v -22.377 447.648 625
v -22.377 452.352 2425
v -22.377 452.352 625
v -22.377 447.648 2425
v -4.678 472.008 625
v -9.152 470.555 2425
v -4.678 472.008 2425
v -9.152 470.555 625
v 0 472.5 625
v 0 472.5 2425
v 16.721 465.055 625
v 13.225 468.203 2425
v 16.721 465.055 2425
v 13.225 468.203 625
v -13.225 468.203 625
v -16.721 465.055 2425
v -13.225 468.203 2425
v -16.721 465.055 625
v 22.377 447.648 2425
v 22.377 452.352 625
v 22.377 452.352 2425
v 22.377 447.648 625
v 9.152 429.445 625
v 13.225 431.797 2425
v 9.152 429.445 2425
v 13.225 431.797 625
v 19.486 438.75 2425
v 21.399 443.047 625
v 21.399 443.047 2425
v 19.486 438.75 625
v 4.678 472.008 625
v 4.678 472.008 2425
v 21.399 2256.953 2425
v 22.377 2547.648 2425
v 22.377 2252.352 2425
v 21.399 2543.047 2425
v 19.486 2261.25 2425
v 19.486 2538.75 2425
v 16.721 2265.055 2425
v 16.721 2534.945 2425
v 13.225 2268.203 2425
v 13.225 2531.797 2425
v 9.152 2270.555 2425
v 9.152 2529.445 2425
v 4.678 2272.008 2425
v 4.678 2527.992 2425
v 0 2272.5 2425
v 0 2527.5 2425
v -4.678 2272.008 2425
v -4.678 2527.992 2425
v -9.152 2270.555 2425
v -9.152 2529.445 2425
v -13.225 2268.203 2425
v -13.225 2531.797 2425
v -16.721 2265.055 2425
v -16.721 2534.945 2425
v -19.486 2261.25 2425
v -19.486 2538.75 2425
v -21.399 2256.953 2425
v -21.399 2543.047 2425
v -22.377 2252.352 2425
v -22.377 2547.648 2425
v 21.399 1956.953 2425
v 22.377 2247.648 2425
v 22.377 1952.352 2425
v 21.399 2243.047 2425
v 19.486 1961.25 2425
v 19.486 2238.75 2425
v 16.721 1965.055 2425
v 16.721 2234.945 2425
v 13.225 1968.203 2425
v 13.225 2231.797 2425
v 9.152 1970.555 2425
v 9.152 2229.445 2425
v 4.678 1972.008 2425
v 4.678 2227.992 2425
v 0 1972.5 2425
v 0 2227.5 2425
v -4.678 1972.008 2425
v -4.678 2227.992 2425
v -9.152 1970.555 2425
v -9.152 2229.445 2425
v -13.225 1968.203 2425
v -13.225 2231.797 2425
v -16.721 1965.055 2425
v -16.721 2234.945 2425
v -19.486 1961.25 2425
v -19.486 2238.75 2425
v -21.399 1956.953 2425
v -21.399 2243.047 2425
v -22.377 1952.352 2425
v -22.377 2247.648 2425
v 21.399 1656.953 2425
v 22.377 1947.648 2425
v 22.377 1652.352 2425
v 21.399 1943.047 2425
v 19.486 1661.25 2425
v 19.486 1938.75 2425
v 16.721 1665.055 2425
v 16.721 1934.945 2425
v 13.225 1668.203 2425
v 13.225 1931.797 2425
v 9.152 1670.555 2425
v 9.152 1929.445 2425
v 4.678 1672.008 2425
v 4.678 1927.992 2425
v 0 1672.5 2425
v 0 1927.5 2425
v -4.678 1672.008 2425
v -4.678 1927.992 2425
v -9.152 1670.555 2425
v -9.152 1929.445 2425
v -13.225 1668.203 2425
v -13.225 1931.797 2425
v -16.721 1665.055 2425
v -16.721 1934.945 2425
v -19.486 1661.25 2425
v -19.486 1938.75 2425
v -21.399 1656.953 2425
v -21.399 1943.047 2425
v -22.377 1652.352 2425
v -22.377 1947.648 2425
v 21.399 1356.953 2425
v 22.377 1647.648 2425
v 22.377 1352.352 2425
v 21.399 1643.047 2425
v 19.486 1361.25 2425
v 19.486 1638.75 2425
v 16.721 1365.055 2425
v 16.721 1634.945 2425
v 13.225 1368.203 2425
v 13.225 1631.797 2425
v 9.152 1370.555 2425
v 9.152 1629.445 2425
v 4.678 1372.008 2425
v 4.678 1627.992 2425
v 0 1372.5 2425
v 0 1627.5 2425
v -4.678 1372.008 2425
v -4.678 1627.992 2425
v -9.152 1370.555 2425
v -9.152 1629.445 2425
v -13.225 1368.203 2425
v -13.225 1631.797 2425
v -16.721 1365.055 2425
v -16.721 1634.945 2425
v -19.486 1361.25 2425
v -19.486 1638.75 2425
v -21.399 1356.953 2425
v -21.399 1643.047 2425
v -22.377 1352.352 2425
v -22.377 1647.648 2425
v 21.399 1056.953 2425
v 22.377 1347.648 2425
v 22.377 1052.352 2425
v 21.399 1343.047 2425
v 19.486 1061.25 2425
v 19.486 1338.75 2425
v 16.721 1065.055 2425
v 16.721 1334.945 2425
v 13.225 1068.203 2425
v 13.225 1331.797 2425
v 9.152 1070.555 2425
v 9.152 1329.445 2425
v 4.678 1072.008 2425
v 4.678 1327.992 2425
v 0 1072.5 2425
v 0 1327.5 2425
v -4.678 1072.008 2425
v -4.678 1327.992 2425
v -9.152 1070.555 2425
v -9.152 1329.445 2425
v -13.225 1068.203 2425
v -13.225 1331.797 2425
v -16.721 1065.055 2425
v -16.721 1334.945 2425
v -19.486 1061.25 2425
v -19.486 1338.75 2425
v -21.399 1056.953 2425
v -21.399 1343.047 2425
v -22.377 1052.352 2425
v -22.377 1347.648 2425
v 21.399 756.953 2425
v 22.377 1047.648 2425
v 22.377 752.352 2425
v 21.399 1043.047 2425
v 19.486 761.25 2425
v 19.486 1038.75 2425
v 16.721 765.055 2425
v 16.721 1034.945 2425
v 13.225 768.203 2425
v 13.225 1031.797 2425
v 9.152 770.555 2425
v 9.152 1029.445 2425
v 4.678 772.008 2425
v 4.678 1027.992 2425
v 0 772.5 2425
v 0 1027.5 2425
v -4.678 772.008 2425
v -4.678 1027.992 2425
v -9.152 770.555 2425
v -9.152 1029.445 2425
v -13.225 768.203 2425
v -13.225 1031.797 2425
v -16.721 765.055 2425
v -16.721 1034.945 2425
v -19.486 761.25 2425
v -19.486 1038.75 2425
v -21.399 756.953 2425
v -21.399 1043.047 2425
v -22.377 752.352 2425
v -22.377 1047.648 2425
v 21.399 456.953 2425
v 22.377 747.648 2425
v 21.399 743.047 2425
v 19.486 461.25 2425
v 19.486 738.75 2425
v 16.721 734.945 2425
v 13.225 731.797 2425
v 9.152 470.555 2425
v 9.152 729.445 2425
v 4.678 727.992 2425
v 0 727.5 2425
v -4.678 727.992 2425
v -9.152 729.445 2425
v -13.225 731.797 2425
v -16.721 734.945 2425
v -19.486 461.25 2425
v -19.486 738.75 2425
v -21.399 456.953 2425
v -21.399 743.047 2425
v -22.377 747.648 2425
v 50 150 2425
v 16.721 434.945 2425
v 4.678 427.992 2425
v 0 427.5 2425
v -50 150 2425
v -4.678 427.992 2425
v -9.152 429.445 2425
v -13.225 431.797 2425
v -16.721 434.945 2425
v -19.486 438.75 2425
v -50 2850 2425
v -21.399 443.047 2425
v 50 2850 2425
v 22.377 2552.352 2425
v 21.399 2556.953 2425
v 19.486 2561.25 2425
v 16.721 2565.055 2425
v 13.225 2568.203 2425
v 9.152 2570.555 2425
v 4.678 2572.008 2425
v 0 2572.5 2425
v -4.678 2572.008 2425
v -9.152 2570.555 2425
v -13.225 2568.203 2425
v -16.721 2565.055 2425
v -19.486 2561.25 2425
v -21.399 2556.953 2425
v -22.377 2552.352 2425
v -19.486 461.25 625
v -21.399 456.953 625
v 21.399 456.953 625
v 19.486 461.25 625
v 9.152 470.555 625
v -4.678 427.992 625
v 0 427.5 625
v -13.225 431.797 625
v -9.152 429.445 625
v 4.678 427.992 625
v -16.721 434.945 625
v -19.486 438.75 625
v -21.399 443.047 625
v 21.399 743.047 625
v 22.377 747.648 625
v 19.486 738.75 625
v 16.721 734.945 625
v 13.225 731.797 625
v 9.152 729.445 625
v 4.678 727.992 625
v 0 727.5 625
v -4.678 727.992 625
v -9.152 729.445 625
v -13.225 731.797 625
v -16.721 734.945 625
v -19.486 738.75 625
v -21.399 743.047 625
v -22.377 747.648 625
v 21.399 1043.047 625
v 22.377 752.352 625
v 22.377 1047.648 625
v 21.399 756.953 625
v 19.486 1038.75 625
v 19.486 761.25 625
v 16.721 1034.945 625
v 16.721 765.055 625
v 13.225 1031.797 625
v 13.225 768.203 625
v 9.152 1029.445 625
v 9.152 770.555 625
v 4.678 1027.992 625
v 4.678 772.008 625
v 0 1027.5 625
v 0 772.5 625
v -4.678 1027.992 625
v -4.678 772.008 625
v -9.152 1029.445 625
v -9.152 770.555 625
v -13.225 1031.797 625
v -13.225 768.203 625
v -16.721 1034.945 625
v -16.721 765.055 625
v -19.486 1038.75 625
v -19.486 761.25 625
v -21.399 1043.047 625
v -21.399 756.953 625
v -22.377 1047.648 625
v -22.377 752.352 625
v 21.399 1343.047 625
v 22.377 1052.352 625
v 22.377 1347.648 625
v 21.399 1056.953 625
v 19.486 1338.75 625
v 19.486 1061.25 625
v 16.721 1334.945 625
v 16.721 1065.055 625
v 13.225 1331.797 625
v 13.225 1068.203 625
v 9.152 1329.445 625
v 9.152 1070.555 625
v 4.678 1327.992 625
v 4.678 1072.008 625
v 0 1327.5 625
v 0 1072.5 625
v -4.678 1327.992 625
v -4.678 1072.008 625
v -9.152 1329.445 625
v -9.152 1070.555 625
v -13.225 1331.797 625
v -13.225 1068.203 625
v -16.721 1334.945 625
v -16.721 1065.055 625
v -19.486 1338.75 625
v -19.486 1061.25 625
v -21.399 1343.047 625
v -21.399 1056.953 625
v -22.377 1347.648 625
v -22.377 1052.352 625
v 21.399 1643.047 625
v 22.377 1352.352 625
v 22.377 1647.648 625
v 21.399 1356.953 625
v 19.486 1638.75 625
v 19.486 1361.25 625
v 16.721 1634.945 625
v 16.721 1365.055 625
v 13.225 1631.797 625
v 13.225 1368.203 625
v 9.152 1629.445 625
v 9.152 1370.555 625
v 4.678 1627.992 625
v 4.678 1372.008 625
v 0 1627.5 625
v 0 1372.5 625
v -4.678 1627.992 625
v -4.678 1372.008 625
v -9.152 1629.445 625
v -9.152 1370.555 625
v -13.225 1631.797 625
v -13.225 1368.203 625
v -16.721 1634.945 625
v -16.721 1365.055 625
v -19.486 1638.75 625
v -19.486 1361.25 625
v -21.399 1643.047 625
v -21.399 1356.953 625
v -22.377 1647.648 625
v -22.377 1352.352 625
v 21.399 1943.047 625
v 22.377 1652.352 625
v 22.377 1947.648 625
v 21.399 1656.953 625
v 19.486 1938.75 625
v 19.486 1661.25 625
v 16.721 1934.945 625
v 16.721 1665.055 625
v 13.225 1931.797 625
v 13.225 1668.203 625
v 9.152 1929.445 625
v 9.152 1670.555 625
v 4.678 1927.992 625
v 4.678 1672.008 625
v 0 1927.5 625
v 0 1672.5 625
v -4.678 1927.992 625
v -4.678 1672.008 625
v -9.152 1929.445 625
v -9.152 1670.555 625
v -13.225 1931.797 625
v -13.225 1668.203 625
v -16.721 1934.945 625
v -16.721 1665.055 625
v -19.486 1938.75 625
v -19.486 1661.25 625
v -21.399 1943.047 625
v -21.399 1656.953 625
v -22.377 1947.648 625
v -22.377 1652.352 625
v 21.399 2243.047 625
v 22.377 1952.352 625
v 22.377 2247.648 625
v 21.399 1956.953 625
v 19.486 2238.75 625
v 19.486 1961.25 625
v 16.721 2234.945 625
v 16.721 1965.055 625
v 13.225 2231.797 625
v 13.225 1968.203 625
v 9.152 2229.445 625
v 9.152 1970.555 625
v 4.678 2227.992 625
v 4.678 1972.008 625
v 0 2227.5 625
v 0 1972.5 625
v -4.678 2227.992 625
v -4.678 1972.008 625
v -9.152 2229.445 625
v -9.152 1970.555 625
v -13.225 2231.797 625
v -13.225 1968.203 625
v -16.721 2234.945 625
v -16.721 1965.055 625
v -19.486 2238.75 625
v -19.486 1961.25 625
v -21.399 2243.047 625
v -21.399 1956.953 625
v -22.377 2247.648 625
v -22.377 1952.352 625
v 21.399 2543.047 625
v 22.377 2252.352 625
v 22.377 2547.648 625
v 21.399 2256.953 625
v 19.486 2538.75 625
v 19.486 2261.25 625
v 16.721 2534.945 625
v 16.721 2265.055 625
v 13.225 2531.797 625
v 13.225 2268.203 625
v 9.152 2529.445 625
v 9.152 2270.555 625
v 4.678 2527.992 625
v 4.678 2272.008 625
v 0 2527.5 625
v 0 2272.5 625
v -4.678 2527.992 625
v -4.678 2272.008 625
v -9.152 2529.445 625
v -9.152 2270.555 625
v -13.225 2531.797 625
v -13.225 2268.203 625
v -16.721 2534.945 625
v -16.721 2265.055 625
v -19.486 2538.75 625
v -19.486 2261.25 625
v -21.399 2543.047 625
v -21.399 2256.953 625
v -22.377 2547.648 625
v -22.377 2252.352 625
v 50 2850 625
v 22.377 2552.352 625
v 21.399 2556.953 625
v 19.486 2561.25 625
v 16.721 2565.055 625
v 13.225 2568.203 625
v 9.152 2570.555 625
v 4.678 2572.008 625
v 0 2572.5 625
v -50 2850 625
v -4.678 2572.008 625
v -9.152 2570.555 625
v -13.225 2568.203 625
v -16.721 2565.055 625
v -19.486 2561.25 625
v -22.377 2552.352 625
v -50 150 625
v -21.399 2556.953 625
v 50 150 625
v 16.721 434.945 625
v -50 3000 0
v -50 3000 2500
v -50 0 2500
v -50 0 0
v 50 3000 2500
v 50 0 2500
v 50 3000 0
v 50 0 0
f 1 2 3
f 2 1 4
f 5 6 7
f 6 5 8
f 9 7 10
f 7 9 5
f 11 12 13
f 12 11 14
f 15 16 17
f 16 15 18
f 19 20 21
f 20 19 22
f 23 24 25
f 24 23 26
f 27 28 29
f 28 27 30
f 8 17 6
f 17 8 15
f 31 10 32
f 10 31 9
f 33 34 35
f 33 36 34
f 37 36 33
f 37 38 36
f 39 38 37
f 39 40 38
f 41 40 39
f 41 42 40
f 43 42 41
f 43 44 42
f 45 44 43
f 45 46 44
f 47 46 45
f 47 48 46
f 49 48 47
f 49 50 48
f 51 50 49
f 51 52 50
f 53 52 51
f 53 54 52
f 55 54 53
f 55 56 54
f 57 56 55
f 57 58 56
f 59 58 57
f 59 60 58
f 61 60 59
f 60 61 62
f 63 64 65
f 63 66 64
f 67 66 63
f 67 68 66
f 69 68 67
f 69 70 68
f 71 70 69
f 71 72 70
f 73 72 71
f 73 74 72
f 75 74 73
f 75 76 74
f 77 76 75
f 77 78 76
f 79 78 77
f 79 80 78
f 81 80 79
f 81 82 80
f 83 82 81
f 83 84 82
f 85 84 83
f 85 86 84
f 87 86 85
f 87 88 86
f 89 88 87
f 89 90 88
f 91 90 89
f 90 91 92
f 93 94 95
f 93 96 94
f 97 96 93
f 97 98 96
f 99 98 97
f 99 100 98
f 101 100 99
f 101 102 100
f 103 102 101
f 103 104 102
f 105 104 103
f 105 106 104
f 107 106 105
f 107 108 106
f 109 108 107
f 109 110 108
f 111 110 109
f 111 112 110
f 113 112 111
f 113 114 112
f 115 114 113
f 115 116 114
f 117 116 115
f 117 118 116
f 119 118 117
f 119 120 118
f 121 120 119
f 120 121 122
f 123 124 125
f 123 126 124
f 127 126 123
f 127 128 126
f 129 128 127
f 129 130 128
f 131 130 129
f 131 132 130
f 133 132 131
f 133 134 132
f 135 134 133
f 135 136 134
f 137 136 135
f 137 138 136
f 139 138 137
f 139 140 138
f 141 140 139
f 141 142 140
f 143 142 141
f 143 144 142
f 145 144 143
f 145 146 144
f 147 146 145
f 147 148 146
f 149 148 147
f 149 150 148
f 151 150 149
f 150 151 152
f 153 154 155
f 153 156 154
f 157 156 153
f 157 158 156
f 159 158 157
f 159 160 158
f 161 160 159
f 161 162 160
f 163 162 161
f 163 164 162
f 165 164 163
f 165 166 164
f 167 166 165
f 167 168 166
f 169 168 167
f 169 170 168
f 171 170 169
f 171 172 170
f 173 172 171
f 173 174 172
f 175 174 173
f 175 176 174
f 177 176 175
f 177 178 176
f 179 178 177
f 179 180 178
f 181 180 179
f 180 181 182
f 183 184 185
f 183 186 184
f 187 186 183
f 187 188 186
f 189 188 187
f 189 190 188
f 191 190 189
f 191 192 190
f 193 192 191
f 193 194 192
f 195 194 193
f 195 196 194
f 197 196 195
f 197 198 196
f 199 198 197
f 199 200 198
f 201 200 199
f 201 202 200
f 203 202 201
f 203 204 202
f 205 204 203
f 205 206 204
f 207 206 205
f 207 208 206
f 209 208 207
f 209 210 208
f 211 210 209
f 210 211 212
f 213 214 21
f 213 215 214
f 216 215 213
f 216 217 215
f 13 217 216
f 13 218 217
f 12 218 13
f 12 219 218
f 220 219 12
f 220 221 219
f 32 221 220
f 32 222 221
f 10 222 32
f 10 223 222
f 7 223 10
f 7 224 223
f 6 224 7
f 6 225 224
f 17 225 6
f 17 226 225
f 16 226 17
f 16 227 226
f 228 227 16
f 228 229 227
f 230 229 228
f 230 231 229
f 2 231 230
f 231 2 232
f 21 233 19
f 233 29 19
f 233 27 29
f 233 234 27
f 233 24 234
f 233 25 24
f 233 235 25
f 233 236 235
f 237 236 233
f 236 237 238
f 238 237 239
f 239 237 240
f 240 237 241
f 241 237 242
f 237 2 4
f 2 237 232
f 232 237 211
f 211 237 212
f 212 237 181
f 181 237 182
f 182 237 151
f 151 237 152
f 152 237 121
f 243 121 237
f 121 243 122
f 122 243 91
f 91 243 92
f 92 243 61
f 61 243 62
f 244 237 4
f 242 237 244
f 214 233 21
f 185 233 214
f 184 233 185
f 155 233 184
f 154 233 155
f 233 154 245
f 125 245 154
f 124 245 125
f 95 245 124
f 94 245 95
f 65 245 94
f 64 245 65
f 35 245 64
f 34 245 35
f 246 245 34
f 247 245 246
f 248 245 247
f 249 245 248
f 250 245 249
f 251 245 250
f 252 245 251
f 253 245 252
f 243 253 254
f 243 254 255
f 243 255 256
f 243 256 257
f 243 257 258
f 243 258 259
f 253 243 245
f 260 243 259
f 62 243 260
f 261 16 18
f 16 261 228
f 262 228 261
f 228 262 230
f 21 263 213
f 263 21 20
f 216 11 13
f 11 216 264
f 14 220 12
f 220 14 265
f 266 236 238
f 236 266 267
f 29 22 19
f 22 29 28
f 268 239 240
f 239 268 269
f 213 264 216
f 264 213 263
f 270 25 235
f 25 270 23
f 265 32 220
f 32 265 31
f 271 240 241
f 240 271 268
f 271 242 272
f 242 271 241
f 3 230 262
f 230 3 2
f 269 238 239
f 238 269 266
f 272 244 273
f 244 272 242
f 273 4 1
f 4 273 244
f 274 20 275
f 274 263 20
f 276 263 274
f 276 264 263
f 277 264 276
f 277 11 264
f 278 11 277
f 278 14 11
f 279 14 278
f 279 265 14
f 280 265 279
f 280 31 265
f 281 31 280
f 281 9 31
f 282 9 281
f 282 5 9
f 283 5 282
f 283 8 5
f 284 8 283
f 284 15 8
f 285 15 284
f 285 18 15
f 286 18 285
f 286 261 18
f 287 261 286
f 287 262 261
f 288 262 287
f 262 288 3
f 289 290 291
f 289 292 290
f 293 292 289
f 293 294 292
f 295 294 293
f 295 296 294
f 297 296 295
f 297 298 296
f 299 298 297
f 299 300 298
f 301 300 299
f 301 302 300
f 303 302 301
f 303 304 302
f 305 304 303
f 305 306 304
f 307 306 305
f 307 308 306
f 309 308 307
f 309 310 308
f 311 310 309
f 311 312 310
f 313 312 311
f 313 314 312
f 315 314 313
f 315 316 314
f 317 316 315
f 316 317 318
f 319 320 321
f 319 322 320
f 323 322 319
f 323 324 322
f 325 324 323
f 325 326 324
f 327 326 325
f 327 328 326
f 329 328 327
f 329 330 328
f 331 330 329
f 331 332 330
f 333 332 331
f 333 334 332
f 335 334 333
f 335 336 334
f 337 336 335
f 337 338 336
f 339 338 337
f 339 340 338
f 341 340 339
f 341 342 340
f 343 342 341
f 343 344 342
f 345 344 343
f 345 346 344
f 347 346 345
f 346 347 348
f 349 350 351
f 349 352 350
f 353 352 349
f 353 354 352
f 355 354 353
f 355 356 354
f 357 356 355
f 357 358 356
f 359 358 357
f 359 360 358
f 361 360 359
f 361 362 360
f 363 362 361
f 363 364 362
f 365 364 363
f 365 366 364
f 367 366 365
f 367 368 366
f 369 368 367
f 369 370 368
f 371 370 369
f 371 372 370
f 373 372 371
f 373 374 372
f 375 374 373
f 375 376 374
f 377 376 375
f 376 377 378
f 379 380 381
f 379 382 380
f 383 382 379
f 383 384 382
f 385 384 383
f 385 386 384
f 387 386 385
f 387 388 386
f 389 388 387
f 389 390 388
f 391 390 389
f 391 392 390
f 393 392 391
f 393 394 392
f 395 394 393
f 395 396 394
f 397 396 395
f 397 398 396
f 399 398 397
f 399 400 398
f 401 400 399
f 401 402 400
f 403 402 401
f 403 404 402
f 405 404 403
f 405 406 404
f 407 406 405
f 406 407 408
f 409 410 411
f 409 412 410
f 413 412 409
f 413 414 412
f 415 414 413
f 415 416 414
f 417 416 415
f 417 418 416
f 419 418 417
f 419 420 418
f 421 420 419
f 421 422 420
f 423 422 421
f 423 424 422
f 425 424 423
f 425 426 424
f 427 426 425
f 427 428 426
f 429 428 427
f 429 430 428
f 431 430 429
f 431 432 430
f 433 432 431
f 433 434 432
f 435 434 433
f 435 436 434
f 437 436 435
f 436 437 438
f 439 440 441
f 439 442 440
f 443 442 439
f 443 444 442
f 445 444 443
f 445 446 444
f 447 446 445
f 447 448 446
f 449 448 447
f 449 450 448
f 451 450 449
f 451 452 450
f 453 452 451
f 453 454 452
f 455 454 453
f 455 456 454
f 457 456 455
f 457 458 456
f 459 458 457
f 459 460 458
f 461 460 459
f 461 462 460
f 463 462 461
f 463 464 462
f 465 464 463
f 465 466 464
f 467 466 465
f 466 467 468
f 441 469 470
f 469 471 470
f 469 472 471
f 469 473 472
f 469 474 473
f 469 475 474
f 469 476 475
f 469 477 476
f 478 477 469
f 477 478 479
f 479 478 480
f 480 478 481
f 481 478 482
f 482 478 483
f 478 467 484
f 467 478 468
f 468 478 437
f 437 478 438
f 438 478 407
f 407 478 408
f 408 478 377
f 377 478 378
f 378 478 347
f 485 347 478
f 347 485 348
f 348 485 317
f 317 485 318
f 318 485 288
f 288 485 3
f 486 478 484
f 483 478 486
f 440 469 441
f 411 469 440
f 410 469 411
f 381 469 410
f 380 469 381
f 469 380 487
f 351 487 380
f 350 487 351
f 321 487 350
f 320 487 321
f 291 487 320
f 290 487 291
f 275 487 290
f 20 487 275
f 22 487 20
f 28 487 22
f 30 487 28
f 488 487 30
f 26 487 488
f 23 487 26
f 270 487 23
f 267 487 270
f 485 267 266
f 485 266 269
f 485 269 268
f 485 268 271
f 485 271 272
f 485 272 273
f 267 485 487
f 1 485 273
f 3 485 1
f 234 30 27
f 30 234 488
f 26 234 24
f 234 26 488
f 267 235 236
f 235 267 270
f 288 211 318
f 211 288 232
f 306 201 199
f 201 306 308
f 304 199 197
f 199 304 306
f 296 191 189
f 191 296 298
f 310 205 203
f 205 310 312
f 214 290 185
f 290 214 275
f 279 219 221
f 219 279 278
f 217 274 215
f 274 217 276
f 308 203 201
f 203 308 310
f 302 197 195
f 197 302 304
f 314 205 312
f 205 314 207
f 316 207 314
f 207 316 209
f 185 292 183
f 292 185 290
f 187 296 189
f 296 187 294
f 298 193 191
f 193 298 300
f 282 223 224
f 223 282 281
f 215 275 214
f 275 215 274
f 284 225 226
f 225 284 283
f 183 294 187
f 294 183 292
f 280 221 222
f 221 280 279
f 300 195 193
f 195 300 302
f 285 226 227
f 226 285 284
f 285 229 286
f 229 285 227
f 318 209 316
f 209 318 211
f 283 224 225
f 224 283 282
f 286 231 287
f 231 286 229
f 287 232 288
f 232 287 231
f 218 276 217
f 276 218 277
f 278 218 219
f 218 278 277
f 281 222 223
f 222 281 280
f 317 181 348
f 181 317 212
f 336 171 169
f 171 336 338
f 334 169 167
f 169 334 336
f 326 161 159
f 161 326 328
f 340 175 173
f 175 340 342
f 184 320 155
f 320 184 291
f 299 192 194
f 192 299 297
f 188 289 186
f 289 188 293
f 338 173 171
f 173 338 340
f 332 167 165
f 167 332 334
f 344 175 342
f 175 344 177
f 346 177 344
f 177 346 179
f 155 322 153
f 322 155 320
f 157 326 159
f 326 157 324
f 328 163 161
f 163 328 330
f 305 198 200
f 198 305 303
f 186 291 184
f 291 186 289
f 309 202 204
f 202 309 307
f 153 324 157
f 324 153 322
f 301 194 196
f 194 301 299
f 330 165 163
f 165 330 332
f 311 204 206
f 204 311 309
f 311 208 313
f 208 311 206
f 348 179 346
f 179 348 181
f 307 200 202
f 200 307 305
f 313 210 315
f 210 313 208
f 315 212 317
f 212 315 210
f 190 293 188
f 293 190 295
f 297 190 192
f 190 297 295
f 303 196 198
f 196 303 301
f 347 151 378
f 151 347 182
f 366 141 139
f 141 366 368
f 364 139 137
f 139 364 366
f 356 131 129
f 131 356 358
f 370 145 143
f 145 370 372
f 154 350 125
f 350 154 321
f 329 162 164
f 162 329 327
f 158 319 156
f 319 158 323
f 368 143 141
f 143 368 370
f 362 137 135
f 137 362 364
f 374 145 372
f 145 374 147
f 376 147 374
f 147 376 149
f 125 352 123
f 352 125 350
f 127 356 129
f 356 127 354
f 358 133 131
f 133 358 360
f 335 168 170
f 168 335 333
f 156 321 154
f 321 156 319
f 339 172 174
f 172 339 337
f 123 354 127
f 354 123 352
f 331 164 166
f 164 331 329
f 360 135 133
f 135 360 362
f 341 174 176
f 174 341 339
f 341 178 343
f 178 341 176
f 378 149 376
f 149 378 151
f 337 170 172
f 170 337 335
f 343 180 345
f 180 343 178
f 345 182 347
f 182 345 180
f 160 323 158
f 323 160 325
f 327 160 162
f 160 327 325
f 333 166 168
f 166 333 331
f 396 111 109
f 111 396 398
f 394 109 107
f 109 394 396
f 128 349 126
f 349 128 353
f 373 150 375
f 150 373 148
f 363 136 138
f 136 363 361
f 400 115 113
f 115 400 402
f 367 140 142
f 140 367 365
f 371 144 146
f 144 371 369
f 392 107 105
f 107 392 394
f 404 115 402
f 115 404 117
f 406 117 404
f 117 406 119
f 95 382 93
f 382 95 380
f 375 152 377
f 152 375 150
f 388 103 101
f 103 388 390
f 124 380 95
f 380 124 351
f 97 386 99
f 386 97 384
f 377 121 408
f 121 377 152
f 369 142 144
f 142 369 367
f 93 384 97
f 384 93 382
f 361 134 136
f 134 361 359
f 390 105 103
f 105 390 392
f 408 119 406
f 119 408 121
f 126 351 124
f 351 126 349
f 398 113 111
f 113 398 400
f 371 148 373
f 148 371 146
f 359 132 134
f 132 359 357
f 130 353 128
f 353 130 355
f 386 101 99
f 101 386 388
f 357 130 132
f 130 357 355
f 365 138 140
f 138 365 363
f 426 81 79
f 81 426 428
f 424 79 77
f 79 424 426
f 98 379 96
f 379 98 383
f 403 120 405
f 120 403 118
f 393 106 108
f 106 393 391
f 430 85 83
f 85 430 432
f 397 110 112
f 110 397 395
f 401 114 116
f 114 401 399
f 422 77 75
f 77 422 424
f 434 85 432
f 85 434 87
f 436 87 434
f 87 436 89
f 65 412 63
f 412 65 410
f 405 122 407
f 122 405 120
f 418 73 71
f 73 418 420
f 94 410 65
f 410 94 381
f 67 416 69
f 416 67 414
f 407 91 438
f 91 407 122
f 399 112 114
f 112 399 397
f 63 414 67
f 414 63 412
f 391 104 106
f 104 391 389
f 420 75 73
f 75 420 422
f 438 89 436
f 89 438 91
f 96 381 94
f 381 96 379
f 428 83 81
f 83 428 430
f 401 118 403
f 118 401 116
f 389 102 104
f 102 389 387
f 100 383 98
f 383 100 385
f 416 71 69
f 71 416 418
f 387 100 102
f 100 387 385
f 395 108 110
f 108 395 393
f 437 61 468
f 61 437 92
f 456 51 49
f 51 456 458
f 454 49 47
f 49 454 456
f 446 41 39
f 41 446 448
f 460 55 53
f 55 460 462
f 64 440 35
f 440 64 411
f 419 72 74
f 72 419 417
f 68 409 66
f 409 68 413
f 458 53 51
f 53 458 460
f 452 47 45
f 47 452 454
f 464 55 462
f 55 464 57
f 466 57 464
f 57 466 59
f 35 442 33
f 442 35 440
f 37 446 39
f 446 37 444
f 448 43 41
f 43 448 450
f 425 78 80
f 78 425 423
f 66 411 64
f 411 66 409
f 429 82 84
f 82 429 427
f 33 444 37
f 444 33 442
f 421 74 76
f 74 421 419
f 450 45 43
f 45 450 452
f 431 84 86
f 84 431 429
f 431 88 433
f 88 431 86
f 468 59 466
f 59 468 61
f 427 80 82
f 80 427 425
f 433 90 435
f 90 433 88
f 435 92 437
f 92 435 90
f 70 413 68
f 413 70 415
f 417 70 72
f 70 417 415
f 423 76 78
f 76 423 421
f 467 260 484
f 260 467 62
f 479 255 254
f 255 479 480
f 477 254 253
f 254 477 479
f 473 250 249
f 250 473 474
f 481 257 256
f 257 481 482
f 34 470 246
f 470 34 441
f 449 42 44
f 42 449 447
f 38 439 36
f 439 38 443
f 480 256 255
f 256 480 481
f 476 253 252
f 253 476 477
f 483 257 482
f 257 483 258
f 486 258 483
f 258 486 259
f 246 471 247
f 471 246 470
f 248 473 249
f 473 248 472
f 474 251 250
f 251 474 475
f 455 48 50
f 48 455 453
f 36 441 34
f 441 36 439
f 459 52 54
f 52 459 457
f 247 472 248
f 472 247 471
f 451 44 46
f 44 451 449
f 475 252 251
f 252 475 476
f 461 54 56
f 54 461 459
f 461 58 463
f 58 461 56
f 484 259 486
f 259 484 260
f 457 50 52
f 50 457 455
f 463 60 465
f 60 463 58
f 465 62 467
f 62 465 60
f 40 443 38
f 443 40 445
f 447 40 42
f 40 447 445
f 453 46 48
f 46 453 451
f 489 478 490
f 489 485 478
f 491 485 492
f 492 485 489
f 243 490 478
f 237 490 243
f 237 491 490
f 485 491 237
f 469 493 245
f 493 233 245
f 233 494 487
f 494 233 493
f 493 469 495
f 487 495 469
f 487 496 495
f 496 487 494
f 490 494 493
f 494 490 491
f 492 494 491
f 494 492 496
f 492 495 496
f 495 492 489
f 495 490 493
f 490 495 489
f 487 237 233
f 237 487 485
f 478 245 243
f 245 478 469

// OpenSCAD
// file: modifiers/diagonalize.scad
include <../templates/basic-dims.scad>

module diagonalize_triangle_sketch(t = section_thickness) {
    x = sin(45) * t;
    y = cos(45) * t;

    polygon([
        [0, y],
        [x, 0],
        [0, -y]
    ]);
}

module diagonalize_triangle(t = section_thickness) {
    rotate([0, 0, 90])
    linear_extrude(section_height)
    diagonalize_triangle_sketch(t);
}

module diagonalize2D() {
    thickness = section_thickness / rt;

    trans = (section_thickness/2)*rt/2;
    len_scale = rt - section_thickness / (rt * section_width);

    rotate([0, 0, 45])
    translate([trans, 0, 0])
    scale([len_scale, 1/rt, 1])
    children();
}


module diagonalize3D(w = section_width, t = section_thickness, edges = "trans") {

    trans = (t/2)*rt/2;
    len_scale = rt - t / (rt * w);

    edge_angle = edges == "cis" ? 270 : 180;
    
    diagonalize_triangle(t/rt);

    translate([-w, w, 0])
    rotate([0, 0, edge_angle]) // 180 For continue, -90 (270) for end
    diagonalize_triangle(t/rt);

    rotate([0, 0, 45])
    translate([0, trans, 0])
    scale([1/rt, len_scale, 1])
    children();
}
// file: templates/basic-dims.scad
unit = 1000;

section_width = unit * 1.5;
section_height = unit * 2.5;
section_thickness = unit * 0.1;

rt = sqrt(2);

//  -- Notes --
//  Z is UP
//  X is FORWARD (out of the screen)
// main file
include <./templates/basic-dims.scad>
include <./modifiers/diagonalize.scad>

total_width = section_width * 2;

window_width = total_width * 0.9;
window_height = total_width * 0.6;
window_offset_bottom = section_height * 0.25;

bar_diam = section_thickness * 0.45;
window_padding = (total_width - window_width)/2;
bar_x_offset = window_padding;
num_bars = 8;
bar_gap = window_width/(num_bars + 1);

module wall_sketch() {

    difference() {
        square([total_width, section_height]);

        translate([total_width/2 - window_width/2, window_offset_bottom, 0])
        square([window_width, window_height]);
    }
}

module wall() {
    rotate([90, 0, 90])
    translate([0, 0, -section_thickness/2])
    linear_extrude(section_thickness)
    wall_sketch();
}

module window_bars() {
    rotate([90, 0, 90])
    for (i = [1 : num_bars]) {
        translate([0, 0, -section_thickness/2])
        translate([bar_x_offset + bar_gap* i, window_offset_bottom, section_thickness/2])
        rotate([-90, 0, 0])
        cylinder(d=bar_diam, h = window_height);
    }
}

wall();
window_bars();
